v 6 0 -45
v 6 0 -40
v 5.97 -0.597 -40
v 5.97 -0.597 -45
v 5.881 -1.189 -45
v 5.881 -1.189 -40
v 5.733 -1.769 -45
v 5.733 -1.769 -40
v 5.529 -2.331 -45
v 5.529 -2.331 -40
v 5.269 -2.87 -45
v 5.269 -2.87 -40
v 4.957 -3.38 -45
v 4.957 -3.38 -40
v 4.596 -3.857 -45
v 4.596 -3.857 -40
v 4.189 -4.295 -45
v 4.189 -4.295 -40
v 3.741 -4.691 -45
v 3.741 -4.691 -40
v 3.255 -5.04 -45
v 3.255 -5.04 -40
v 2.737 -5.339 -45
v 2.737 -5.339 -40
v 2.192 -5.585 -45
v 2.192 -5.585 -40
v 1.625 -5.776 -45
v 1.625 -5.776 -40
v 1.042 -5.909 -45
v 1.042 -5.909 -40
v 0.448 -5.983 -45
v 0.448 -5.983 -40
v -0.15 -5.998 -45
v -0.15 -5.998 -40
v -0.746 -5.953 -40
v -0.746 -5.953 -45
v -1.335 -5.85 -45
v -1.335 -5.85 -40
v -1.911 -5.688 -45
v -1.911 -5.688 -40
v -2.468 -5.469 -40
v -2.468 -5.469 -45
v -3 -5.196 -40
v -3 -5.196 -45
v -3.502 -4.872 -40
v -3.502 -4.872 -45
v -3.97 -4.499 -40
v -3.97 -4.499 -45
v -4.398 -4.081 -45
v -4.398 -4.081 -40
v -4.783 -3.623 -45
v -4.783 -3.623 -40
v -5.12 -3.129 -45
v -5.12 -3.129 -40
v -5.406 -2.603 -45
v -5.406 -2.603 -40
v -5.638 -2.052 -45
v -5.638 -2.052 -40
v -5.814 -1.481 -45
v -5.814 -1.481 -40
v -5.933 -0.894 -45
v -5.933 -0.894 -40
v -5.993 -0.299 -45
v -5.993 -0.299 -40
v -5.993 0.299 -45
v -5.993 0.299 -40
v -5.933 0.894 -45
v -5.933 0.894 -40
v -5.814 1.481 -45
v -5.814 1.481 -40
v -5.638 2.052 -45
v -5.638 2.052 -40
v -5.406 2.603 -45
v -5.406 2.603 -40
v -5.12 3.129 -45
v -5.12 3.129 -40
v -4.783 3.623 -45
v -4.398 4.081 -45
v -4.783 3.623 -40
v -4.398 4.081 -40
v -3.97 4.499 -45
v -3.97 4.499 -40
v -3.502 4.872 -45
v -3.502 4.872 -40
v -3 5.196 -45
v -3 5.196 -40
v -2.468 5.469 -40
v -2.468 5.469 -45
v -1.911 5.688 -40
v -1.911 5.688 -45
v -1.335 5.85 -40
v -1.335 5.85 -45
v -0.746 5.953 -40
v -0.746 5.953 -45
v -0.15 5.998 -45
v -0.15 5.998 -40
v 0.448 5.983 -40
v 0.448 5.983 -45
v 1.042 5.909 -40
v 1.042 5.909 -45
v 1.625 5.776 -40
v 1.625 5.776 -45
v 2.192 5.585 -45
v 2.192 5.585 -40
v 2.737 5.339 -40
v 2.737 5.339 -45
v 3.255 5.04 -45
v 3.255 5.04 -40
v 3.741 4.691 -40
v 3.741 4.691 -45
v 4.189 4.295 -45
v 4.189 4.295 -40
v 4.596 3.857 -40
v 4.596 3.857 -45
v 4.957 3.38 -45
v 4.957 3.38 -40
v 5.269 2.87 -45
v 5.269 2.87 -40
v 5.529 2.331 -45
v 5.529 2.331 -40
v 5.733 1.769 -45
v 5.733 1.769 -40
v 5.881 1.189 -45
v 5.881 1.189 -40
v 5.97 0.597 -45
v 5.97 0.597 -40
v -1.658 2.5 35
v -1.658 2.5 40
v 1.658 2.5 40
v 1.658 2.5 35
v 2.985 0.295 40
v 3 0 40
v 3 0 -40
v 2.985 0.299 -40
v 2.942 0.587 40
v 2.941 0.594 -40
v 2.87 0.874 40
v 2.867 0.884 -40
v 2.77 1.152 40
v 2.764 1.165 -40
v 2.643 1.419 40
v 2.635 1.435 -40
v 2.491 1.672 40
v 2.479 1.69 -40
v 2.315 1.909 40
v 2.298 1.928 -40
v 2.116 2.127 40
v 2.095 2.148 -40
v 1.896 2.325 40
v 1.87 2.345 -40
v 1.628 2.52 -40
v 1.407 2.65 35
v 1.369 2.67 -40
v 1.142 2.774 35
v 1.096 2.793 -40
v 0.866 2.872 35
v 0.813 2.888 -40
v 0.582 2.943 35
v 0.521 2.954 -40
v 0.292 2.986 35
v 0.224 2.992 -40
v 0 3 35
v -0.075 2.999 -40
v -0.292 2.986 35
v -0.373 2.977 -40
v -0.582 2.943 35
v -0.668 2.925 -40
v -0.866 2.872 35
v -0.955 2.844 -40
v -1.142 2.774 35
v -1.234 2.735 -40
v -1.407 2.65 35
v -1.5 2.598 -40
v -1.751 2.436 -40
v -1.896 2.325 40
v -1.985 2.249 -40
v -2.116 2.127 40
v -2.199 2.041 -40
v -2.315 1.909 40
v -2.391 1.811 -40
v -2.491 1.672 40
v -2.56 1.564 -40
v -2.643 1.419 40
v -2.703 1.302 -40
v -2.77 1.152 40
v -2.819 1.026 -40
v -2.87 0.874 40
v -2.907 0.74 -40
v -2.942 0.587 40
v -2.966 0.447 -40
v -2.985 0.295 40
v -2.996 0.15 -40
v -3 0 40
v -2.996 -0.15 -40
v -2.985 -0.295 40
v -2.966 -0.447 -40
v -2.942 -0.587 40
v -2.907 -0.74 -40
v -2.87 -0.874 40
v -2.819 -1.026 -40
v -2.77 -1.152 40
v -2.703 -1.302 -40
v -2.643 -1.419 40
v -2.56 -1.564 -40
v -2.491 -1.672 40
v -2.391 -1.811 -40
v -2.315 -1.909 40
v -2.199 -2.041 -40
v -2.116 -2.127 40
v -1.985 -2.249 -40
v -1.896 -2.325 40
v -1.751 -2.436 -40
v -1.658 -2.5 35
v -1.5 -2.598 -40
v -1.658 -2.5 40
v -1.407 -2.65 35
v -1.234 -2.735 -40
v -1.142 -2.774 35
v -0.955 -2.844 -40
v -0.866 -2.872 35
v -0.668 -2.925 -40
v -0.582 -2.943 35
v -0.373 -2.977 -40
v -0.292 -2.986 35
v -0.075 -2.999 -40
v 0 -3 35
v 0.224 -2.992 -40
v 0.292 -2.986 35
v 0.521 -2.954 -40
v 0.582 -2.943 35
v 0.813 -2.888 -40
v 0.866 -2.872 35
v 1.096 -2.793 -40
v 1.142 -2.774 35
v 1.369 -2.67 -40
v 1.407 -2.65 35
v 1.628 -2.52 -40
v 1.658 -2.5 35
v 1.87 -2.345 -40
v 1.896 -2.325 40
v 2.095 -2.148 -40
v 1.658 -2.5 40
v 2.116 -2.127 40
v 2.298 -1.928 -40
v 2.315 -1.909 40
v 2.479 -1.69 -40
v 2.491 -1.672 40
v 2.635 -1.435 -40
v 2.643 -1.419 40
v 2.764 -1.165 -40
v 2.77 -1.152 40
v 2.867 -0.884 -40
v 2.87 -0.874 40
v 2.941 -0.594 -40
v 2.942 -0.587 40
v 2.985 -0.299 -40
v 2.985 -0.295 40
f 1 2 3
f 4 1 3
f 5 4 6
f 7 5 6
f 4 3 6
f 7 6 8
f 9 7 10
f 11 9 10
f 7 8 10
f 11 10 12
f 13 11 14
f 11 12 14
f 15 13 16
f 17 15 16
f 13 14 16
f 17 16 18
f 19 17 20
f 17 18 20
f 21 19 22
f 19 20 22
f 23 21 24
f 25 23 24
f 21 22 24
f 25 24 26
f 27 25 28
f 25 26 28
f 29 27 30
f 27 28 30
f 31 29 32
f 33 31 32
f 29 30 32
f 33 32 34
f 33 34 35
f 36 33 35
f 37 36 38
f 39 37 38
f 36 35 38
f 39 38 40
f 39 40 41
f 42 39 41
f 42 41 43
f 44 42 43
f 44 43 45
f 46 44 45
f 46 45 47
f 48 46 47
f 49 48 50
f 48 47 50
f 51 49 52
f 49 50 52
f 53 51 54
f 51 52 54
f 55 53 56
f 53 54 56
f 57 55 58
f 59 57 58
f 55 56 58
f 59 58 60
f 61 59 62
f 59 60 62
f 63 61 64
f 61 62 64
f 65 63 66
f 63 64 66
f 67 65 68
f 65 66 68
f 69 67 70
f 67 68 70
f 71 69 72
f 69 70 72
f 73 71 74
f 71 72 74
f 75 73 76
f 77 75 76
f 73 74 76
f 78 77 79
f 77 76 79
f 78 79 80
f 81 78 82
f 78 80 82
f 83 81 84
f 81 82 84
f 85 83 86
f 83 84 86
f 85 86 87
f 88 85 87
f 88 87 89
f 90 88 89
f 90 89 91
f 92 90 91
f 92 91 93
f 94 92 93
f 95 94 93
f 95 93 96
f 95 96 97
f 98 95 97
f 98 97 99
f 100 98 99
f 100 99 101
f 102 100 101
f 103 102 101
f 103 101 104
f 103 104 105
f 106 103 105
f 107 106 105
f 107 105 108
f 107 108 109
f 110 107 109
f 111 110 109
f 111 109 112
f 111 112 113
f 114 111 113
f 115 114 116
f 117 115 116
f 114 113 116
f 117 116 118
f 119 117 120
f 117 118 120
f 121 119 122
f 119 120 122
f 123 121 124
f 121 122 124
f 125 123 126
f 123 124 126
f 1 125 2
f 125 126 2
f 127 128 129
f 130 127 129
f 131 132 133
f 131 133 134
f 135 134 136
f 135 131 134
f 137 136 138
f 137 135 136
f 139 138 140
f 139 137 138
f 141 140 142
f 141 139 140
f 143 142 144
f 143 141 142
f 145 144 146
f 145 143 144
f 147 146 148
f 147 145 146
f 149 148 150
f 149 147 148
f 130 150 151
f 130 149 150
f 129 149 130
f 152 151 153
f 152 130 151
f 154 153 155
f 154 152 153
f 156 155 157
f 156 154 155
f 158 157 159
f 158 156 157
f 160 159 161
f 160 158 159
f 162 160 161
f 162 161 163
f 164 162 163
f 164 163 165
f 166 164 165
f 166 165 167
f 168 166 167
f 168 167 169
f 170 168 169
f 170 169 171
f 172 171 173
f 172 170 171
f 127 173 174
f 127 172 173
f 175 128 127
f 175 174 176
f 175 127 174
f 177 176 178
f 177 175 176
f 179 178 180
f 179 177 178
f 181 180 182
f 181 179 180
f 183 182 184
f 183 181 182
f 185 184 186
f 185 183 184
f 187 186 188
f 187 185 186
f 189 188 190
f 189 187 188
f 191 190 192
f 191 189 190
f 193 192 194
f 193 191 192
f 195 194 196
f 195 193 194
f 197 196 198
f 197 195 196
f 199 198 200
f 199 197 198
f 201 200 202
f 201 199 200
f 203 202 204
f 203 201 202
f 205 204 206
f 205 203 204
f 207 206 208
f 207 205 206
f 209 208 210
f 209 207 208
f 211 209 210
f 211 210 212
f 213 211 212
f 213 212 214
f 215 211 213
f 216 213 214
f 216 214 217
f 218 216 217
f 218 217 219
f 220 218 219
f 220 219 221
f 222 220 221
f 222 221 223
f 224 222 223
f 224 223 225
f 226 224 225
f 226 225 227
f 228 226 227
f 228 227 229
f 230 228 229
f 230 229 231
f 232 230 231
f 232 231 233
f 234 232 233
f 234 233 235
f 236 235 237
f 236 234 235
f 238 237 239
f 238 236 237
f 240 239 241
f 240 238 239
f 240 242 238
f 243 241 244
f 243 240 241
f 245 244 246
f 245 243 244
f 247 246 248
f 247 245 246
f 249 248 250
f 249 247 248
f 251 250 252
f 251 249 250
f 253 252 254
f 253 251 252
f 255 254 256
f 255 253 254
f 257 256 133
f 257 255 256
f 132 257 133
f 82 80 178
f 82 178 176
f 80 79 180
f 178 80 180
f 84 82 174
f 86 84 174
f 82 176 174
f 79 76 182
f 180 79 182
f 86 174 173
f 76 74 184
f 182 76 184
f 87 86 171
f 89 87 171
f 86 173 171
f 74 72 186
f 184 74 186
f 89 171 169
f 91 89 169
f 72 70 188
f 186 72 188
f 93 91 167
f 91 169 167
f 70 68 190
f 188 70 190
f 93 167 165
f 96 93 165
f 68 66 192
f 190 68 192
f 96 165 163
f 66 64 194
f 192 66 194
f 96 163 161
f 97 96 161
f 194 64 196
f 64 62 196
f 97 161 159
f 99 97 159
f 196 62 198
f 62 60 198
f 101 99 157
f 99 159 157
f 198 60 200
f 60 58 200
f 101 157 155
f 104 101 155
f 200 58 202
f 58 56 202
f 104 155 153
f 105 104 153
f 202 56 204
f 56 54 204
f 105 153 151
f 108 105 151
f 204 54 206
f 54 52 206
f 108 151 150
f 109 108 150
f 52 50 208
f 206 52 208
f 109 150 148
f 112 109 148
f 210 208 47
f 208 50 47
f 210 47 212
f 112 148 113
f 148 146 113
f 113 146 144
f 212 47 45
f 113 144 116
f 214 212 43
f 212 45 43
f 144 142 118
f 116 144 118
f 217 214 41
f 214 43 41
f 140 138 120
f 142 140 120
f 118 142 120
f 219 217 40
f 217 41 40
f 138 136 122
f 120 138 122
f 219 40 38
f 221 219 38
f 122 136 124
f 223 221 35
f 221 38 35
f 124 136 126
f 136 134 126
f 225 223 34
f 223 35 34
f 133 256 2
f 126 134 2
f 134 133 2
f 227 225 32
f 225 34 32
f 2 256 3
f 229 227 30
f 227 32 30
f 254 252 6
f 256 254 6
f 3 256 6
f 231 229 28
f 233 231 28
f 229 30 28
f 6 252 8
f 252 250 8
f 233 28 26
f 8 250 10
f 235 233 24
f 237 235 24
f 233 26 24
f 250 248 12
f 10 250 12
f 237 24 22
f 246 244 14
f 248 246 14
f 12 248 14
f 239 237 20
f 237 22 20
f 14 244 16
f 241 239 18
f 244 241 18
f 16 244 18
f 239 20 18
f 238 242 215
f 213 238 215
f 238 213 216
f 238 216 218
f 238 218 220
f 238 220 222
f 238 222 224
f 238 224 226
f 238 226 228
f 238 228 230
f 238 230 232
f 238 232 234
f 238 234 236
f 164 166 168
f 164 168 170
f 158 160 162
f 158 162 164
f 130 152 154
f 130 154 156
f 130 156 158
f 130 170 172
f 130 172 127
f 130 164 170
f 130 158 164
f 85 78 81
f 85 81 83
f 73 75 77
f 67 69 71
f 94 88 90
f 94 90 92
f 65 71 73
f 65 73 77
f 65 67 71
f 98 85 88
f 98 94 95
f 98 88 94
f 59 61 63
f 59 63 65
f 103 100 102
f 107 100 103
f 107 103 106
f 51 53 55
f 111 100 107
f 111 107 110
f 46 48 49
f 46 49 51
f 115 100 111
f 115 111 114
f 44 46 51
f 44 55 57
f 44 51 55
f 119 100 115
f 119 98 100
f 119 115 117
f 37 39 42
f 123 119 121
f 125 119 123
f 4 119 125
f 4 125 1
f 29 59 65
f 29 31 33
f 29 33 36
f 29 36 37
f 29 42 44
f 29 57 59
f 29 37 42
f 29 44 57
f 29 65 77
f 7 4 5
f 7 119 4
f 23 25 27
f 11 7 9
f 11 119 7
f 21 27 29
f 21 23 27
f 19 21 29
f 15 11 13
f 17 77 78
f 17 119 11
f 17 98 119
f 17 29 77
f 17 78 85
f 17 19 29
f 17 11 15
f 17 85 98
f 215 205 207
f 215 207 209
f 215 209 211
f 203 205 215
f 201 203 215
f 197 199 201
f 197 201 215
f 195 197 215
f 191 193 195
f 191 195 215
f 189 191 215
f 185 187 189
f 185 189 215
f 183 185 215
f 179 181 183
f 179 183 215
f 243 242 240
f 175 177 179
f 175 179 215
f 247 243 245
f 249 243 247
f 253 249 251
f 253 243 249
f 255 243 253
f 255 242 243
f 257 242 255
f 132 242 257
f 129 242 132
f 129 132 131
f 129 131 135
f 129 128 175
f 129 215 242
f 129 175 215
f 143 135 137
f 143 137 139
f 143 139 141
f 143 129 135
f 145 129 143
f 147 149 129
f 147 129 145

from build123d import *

# Parameters (mm, degrees)
F0_R     = 3
F1_DEPTH = 40
F2_R     = 6
F2_R_2   = 3
F3_DEPTH = 5
F5_DEPTH = 5


with BuildPart() as f1:
    # F0 (on Top) → F1 (new body, symmetric)
    with BuildSketch(Plane.XY):
        Circle(F0_R)
    extrude(amount=F1_DEPTH, both=True)

    # F2 (on face) → F3 (join)
    with BuildSketch(Plane(origin=(0, 0, -40), x_dir=(1, 0, 0), z_dir=(0, 0, -1))):
        Circle(F2_R)
        Circle(F2_R_2, mode=Mode.SUBTRACT)
        Circle(F2_R_2)
    extrude(amount=F3_DEPTH)

    # F4 (on face) → F5 (cut)
    with BuildSketch(Plane.XY.offset(40)):
        with BuildLine():
            Line((4.5341607578, -3.7982849256), (4.5341607578, -2.5))
            Line((4.5341607578, -2.5), (1.6583123952, -2.5))
            ThreePointArc((1.6583123952, -2.5), (0, -3), (-1.6583123952, -2.5))
            Line((-1.6583123952, -2.5), (-4.5341607578, -2.5))
            Line((-4.5341607578, -2.5), (-4.5341607578, -3.7982849256))
            Line((-4.5341607578, -3.7982849256), (4.5341607578, -3.7982849256))
        make_face()
        with BuildLine():
            ThreePointArc((-1.6583123952, -2.5), (0, -3), (1.6583123952, -2.5))
            Line((1.6583123952, -2.5), (-1.6583123952, -2.5))
        make_face()
        with BuildLine():
            Line((1.6583123952, 2.5), (4.5341607578, 2.5))
            Line((4.5341607578, 2.5), (4.5341607578, 3.7982849256))
            Line((4.5341607578, 3.7982849256), (-4.5341607578, 3.7982849256))
            Line((-4.5341607578, 3.7982849256), (-4.5341607578, 2.5))
            Line((-4.5341607578, 2.5), (-1.6583123952, 2.5))
            ThreePointArc((-1.6583123952, 2.5), (0, 3), (1.6583123952, 2.5))
        make_face()
        with BuildLine():
            Line((-1.6583123952, 2.5), (1.6583123952, 2.5))
            ThreePointArc((1.6583123952, 2.5), (0, 3), (-1.6583123952, 2.5))
        make_face()
    extrude(amount=-F5_DEPTH, mode=Mode.SUBTRACT)


solid = f1.part
